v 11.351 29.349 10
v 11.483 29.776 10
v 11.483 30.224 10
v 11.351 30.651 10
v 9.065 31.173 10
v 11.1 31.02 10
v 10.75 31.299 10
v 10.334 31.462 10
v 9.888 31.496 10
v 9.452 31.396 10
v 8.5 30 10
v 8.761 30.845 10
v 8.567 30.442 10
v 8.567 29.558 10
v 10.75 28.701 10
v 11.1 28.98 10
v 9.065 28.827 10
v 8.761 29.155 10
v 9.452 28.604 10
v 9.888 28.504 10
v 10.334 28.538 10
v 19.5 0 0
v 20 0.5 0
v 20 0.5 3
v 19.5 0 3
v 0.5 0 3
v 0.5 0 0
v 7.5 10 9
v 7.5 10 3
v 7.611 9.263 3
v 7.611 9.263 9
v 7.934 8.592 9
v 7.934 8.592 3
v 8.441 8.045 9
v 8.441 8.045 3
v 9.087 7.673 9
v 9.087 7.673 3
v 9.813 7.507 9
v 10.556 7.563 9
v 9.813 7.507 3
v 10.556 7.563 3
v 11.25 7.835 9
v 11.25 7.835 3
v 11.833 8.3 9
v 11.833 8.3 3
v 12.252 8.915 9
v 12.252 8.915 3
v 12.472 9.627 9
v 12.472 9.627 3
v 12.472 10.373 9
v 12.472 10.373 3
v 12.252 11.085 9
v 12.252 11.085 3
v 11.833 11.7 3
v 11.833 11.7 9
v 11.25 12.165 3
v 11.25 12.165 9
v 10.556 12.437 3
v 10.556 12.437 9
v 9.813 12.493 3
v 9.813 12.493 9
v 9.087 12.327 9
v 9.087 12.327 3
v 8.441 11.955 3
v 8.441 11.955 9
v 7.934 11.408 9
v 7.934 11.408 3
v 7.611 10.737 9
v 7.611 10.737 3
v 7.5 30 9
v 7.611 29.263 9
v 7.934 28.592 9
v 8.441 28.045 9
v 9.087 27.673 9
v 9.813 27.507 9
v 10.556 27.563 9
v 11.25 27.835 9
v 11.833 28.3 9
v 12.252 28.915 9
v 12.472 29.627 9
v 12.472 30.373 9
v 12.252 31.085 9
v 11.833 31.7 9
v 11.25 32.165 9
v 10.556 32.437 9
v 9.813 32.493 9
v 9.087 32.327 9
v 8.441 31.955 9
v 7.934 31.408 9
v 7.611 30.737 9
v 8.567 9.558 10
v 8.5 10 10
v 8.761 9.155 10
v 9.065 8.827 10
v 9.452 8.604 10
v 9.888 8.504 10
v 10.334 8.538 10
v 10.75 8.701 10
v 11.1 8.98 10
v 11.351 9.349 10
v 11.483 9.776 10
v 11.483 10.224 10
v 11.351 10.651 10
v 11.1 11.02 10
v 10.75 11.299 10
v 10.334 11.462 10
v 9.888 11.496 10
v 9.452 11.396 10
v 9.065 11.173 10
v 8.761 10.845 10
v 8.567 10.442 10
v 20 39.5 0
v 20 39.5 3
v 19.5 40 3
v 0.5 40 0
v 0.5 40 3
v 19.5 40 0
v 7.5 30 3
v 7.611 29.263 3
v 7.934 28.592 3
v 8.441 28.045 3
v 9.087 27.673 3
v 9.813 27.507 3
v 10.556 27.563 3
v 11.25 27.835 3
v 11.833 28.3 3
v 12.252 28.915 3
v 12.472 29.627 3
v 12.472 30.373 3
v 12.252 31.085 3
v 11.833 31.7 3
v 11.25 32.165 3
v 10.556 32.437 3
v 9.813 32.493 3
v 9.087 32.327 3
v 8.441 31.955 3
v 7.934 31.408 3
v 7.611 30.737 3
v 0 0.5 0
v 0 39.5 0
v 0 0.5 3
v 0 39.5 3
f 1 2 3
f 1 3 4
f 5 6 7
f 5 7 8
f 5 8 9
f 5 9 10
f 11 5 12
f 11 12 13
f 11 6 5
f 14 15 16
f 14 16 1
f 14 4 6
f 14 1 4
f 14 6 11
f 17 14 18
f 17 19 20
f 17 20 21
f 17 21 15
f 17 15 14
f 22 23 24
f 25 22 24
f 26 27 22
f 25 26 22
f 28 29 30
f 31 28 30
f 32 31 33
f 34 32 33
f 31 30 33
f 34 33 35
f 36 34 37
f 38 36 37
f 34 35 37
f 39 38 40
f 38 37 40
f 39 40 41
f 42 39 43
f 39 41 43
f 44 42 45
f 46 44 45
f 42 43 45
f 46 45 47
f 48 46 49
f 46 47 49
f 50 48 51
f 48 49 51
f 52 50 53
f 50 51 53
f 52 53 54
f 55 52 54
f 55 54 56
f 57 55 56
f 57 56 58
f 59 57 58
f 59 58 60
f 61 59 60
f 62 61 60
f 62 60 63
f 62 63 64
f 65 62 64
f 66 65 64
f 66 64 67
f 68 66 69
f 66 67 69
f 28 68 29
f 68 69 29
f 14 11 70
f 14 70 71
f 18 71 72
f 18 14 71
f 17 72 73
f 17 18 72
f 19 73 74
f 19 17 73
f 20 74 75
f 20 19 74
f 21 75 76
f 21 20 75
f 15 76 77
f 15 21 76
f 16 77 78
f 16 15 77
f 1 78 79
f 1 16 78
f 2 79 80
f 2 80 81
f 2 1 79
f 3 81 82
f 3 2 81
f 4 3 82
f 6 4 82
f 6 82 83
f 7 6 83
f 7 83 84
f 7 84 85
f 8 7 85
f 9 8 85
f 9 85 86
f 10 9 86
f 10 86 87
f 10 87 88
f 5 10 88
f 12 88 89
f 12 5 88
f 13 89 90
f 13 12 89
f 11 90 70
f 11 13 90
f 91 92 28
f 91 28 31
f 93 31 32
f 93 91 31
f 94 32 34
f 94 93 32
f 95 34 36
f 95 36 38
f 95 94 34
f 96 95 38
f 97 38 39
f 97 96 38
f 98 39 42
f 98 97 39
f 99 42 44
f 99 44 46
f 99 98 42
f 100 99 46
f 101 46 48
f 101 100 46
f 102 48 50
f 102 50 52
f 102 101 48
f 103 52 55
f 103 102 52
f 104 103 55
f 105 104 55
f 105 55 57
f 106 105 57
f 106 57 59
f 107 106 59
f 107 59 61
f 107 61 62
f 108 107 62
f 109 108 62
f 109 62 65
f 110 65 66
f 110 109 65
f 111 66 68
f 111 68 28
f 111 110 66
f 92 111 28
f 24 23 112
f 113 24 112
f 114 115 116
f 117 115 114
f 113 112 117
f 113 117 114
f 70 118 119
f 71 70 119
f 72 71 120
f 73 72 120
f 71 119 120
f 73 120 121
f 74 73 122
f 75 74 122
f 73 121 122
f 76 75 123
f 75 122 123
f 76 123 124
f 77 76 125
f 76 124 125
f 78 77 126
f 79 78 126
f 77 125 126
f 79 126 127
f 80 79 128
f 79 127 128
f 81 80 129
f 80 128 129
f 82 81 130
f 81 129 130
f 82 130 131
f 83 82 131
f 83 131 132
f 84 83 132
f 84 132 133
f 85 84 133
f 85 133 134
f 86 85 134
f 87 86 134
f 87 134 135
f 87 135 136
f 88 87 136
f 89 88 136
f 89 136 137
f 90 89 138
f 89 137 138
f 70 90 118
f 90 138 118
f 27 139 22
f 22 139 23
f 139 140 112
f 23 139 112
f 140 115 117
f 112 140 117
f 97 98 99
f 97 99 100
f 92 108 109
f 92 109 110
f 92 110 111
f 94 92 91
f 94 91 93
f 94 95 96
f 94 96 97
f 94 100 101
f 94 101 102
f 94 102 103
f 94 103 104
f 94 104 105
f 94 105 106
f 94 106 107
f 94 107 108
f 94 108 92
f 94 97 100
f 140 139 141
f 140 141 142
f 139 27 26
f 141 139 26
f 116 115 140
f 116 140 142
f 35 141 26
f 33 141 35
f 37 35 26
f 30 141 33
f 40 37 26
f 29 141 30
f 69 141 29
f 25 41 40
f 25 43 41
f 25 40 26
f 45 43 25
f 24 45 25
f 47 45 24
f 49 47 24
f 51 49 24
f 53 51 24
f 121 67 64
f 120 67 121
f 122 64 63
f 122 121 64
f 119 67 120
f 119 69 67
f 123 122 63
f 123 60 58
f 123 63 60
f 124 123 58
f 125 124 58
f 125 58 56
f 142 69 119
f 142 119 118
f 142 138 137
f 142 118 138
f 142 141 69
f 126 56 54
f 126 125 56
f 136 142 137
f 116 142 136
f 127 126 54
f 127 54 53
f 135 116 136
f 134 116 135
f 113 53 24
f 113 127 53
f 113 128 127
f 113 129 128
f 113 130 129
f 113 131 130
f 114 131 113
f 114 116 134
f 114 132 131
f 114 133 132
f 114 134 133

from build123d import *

# Parameters (mm, degrees)
SKETCH1_W           = 20
SKETCH1_H           = 40
BOSS_EXTRUDE1_DEPTH = 3
SKETCH2_R           = 2.5
BOSS_EXTRUDE2_DEPTH = 7
CHAMFER1_SIZE       = 1
CHAMFER2_SIZE       = 0.5


with BuildPart() as part:
    # Sketch1 → Boss-Extrude1 (new body)
    with BuildSketch(Plane.XY):
        with Locations((10, 20)):
            Rectangle(SKETCH1_W, SKETCH1_H)
    extrude(amount=BOSS_EXTRUDE1_DEPTH)

    # Sketch2 → Boss-Extrude2 (add)
    with BuildSketch(Plane.XY.offset(3)):
        with Locations(Location((10, 30, 0), (0, 0, 180))):
            Circle(SKETCH2_R)
        with Locations(Location((10, 10, 0), (0, 0, 180))):
            Circle(SKETCH2_R)
    extrude(amount=BOSS_EXTRUDE2_DEPTH)

    # Chamfer1
    chamfer1_edges = [part.edges().sort_by_distance(p)[0] for p in [
        (12.5, 30, 10),
        (12.5, 10, 10),
    ]]
    chamfer(chamfer1_edges, length=CHAMFER1_SIZE)

    # Chamfer2
    chamfer2_edges = [part.edges().sort_by_distance(p)[0] for p in [
        (0, 40, 1.5),
        (20, 40, 1.5),
        (20, 0, 1.5),
        (0, 0, 1.5),
    ]]
    chamfer(chamfer2_edges, length=CHAMFER2_SIZE)


solid = part.part
